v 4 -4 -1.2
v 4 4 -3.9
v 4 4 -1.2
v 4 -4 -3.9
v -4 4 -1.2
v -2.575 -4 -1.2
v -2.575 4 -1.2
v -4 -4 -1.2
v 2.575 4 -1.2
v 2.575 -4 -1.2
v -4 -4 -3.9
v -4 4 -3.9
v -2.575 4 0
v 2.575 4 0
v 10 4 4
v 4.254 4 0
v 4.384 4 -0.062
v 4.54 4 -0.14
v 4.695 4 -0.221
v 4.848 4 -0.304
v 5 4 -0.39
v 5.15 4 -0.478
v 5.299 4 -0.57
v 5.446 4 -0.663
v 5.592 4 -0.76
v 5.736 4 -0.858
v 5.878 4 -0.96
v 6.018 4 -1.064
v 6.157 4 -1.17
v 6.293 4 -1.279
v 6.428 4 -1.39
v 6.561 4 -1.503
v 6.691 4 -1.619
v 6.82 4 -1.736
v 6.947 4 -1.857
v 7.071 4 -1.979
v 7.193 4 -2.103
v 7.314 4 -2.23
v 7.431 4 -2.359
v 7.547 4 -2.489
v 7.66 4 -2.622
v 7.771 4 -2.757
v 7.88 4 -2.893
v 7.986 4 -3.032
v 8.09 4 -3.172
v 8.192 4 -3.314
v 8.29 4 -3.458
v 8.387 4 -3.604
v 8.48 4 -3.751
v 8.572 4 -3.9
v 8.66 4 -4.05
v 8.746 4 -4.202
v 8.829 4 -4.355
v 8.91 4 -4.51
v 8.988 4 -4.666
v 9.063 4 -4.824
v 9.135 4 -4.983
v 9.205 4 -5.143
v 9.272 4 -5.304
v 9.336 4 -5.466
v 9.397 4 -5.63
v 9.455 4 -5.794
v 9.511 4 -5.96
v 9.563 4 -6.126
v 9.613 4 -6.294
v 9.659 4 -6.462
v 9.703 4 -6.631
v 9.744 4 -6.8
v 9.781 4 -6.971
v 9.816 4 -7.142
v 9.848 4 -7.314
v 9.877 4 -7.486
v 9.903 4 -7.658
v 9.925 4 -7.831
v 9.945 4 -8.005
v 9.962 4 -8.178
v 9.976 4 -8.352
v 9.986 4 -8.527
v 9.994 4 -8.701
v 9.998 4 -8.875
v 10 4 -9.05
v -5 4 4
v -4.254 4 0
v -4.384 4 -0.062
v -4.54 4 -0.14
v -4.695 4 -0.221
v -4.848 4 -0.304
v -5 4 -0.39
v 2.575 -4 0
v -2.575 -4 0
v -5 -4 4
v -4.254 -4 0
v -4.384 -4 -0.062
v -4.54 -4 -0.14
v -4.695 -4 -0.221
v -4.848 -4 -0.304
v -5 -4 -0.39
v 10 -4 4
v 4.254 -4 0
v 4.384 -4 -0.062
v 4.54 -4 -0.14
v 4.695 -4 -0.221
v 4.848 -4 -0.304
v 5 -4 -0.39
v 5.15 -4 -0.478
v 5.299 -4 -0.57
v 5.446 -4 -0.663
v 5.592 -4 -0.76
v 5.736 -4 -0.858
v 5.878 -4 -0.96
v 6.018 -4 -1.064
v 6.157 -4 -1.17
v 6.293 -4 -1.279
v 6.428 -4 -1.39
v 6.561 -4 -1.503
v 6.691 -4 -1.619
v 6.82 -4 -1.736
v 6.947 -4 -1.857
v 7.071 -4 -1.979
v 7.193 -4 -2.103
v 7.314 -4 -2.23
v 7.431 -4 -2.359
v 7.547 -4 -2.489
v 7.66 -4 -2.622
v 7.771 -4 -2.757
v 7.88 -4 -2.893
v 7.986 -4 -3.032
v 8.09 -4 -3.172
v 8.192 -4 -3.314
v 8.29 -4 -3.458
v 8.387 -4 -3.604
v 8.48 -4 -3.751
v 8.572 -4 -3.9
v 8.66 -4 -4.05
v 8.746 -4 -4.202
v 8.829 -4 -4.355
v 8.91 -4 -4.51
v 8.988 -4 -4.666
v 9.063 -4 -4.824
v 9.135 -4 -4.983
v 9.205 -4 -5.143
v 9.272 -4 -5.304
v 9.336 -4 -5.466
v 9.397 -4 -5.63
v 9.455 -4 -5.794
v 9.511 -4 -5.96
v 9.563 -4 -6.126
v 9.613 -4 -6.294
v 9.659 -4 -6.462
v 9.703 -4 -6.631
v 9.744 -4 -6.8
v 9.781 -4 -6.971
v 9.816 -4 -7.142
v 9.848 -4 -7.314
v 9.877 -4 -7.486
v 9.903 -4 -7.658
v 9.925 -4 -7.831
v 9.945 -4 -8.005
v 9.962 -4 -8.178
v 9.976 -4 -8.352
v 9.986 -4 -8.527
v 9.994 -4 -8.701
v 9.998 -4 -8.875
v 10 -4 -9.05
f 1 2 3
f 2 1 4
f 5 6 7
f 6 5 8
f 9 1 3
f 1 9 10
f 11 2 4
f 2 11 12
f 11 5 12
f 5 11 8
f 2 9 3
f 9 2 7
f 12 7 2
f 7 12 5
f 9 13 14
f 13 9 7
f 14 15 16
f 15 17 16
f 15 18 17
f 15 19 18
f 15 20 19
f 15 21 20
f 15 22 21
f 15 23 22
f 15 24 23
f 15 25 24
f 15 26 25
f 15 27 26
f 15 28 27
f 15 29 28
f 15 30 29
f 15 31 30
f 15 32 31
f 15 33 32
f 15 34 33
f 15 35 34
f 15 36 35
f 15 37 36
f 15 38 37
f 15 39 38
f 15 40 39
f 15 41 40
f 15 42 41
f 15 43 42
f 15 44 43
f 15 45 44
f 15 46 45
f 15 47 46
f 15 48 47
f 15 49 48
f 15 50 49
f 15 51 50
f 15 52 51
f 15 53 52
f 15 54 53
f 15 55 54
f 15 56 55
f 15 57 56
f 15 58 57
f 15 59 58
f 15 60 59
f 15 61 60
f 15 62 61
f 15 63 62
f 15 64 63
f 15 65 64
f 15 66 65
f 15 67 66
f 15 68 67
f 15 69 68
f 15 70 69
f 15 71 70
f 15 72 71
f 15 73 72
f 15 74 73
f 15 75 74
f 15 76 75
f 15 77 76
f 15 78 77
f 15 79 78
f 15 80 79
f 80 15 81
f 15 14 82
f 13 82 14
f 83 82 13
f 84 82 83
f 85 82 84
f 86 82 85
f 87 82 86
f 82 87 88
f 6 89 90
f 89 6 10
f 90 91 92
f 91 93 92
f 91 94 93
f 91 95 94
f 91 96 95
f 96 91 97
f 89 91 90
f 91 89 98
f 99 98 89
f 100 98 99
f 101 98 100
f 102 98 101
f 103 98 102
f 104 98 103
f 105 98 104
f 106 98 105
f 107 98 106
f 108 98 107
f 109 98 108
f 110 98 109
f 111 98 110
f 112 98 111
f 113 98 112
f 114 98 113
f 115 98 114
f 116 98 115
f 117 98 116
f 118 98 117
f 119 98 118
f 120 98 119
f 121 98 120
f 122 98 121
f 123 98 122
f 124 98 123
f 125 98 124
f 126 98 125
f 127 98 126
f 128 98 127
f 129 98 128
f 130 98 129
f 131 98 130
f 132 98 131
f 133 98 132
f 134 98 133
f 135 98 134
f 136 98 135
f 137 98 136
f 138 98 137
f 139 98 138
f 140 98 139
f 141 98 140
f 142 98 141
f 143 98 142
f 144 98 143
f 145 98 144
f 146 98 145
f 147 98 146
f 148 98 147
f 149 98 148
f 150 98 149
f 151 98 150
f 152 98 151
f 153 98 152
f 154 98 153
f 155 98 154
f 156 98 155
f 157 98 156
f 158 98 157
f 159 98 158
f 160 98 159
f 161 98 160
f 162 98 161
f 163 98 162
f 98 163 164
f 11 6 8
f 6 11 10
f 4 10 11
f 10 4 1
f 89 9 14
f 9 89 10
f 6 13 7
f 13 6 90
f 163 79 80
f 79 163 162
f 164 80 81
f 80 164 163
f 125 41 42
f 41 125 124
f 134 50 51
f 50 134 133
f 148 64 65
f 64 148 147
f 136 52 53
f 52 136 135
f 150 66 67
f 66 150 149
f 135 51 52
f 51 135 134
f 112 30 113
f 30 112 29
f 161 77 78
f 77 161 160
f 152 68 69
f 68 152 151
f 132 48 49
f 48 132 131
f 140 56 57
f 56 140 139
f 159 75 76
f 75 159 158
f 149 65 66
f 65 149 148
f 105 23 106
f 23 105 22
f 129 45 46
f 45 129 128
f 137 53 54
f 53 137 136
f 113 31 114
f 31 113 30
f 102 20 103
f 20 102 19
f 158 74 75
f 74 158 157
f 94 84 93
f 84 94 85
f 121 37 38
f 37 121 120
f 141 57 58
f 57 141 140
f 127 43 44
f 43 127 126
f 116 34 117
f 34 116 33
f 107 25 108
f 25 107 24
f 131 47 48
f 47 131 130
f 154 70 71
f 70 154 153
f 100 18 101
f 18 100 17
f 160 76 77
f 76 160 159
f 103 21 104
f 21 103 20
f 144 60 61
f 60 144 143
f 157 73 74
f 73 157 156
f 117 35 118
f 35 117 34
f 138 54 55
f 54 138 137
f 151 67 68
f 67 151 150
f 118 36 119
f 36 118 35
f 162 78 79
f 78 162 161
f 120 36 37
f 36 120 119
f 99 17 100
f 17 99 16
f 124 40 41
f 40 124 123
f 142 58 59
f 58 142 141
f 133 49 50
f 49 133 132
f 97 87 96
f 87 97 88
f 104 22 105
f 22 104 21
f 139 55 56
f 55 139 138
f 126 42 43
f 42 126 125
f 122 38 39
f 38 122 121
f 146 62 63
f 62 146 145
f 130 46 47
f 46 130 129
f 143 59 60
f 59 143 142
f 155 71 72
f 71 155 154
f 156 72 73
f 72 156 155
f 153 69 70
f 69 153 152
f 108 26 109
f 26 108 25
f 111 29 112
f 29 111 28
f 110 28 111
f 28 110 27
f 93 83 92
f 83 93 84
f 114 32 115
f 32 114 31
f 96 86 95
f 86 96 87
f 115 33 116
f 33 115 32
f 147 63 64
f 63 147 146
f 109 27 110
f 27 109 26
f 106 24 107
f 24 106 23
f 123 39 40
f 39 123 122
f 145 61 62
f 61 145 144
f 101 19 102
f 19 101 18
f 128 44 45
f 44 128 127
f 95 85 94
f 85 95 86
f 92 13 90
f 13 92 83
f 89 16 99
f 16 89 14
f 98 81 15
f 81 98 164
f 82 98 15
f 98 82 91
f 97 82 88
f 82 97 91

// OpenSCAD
$fs = 0.1;
$fa = 1;
delta = $preview ? 0.005 : 0; //for better preview rendering

rail_width = 5.3;
rail_inside_width = 10.0;
rail_depth = 3.2;
rail_top_strength = 1.2;
rail_d = 20.0;
rail_d_cut = 18.1;

rail_side_gap = 0.15;
rail_inside_side_gap = 2;
rail_depth_gap = 0.5;
rail_margin = 0;

l=8;

rail_connector(l);

x=rail_d/2;
x2 = 5;
z_top = 4;
z_bottom = rail_d_cut/2;
difference() {
  translate([x/2-x2/2,0,-z_bottom/2+z_top/2])
    cube([x+x2,l,z_top+z_bottom], center=true);
  rail_outline(10+2*delta);
}

module rail_outline(l) {
  translate([0,0,-rail_d_cut/2])
  difference() {
    translate([0,l/2,0])
      rotate([90,0,0]) cylinder(d=rail_d, h=l);
    translate([0,0,rail_d_cut+delta])
      cube([rail_d, l+2*delta, rail_d_cut], center=true);
    translate([0,0,-rail_d_cut-delta])
      cube([rail_d, l+2*delta, rail_d_cut], center=true);
  }
}

module rail_connector(l, rounding=0) {
  // the thing inside the rail
  z1 = rail_depth - rail_depth_gap;
  z2 = rail_top_strength+rail_margin;
  translate([0,0,-z1/2-z2])
    roundedcube_simple([rail_inside_width-rail_inside_side_gap, l, z1], center=true, radius=rounding);
  // connector
  translate([0,0,-z2/2])
    cube([rail_width-rail_side_gap, l, z2], center=true);
}

module roundedcube_simple(size = [1, 1, 1], center = false, radius = 0.5) {
	// If single value, convert to [x, y, z] vector
	size = (size[0] == undef) ? [size, size, size] : size;

	translate = (center == false) ?
		[radius, radius, radius] :
		[
			radius - (size[0] / 2),
			radius - (size[1] / 2),
			radius - (size[2] / 2)
	];

	translate(v = translate)
	minkowski() {
		cube(size = [
			size[0] - (radius * 2),
			size[1] - (radius * 2),
			size[2] - (radius * 2)
		]);
		sphere(r = radius);
	}
}
